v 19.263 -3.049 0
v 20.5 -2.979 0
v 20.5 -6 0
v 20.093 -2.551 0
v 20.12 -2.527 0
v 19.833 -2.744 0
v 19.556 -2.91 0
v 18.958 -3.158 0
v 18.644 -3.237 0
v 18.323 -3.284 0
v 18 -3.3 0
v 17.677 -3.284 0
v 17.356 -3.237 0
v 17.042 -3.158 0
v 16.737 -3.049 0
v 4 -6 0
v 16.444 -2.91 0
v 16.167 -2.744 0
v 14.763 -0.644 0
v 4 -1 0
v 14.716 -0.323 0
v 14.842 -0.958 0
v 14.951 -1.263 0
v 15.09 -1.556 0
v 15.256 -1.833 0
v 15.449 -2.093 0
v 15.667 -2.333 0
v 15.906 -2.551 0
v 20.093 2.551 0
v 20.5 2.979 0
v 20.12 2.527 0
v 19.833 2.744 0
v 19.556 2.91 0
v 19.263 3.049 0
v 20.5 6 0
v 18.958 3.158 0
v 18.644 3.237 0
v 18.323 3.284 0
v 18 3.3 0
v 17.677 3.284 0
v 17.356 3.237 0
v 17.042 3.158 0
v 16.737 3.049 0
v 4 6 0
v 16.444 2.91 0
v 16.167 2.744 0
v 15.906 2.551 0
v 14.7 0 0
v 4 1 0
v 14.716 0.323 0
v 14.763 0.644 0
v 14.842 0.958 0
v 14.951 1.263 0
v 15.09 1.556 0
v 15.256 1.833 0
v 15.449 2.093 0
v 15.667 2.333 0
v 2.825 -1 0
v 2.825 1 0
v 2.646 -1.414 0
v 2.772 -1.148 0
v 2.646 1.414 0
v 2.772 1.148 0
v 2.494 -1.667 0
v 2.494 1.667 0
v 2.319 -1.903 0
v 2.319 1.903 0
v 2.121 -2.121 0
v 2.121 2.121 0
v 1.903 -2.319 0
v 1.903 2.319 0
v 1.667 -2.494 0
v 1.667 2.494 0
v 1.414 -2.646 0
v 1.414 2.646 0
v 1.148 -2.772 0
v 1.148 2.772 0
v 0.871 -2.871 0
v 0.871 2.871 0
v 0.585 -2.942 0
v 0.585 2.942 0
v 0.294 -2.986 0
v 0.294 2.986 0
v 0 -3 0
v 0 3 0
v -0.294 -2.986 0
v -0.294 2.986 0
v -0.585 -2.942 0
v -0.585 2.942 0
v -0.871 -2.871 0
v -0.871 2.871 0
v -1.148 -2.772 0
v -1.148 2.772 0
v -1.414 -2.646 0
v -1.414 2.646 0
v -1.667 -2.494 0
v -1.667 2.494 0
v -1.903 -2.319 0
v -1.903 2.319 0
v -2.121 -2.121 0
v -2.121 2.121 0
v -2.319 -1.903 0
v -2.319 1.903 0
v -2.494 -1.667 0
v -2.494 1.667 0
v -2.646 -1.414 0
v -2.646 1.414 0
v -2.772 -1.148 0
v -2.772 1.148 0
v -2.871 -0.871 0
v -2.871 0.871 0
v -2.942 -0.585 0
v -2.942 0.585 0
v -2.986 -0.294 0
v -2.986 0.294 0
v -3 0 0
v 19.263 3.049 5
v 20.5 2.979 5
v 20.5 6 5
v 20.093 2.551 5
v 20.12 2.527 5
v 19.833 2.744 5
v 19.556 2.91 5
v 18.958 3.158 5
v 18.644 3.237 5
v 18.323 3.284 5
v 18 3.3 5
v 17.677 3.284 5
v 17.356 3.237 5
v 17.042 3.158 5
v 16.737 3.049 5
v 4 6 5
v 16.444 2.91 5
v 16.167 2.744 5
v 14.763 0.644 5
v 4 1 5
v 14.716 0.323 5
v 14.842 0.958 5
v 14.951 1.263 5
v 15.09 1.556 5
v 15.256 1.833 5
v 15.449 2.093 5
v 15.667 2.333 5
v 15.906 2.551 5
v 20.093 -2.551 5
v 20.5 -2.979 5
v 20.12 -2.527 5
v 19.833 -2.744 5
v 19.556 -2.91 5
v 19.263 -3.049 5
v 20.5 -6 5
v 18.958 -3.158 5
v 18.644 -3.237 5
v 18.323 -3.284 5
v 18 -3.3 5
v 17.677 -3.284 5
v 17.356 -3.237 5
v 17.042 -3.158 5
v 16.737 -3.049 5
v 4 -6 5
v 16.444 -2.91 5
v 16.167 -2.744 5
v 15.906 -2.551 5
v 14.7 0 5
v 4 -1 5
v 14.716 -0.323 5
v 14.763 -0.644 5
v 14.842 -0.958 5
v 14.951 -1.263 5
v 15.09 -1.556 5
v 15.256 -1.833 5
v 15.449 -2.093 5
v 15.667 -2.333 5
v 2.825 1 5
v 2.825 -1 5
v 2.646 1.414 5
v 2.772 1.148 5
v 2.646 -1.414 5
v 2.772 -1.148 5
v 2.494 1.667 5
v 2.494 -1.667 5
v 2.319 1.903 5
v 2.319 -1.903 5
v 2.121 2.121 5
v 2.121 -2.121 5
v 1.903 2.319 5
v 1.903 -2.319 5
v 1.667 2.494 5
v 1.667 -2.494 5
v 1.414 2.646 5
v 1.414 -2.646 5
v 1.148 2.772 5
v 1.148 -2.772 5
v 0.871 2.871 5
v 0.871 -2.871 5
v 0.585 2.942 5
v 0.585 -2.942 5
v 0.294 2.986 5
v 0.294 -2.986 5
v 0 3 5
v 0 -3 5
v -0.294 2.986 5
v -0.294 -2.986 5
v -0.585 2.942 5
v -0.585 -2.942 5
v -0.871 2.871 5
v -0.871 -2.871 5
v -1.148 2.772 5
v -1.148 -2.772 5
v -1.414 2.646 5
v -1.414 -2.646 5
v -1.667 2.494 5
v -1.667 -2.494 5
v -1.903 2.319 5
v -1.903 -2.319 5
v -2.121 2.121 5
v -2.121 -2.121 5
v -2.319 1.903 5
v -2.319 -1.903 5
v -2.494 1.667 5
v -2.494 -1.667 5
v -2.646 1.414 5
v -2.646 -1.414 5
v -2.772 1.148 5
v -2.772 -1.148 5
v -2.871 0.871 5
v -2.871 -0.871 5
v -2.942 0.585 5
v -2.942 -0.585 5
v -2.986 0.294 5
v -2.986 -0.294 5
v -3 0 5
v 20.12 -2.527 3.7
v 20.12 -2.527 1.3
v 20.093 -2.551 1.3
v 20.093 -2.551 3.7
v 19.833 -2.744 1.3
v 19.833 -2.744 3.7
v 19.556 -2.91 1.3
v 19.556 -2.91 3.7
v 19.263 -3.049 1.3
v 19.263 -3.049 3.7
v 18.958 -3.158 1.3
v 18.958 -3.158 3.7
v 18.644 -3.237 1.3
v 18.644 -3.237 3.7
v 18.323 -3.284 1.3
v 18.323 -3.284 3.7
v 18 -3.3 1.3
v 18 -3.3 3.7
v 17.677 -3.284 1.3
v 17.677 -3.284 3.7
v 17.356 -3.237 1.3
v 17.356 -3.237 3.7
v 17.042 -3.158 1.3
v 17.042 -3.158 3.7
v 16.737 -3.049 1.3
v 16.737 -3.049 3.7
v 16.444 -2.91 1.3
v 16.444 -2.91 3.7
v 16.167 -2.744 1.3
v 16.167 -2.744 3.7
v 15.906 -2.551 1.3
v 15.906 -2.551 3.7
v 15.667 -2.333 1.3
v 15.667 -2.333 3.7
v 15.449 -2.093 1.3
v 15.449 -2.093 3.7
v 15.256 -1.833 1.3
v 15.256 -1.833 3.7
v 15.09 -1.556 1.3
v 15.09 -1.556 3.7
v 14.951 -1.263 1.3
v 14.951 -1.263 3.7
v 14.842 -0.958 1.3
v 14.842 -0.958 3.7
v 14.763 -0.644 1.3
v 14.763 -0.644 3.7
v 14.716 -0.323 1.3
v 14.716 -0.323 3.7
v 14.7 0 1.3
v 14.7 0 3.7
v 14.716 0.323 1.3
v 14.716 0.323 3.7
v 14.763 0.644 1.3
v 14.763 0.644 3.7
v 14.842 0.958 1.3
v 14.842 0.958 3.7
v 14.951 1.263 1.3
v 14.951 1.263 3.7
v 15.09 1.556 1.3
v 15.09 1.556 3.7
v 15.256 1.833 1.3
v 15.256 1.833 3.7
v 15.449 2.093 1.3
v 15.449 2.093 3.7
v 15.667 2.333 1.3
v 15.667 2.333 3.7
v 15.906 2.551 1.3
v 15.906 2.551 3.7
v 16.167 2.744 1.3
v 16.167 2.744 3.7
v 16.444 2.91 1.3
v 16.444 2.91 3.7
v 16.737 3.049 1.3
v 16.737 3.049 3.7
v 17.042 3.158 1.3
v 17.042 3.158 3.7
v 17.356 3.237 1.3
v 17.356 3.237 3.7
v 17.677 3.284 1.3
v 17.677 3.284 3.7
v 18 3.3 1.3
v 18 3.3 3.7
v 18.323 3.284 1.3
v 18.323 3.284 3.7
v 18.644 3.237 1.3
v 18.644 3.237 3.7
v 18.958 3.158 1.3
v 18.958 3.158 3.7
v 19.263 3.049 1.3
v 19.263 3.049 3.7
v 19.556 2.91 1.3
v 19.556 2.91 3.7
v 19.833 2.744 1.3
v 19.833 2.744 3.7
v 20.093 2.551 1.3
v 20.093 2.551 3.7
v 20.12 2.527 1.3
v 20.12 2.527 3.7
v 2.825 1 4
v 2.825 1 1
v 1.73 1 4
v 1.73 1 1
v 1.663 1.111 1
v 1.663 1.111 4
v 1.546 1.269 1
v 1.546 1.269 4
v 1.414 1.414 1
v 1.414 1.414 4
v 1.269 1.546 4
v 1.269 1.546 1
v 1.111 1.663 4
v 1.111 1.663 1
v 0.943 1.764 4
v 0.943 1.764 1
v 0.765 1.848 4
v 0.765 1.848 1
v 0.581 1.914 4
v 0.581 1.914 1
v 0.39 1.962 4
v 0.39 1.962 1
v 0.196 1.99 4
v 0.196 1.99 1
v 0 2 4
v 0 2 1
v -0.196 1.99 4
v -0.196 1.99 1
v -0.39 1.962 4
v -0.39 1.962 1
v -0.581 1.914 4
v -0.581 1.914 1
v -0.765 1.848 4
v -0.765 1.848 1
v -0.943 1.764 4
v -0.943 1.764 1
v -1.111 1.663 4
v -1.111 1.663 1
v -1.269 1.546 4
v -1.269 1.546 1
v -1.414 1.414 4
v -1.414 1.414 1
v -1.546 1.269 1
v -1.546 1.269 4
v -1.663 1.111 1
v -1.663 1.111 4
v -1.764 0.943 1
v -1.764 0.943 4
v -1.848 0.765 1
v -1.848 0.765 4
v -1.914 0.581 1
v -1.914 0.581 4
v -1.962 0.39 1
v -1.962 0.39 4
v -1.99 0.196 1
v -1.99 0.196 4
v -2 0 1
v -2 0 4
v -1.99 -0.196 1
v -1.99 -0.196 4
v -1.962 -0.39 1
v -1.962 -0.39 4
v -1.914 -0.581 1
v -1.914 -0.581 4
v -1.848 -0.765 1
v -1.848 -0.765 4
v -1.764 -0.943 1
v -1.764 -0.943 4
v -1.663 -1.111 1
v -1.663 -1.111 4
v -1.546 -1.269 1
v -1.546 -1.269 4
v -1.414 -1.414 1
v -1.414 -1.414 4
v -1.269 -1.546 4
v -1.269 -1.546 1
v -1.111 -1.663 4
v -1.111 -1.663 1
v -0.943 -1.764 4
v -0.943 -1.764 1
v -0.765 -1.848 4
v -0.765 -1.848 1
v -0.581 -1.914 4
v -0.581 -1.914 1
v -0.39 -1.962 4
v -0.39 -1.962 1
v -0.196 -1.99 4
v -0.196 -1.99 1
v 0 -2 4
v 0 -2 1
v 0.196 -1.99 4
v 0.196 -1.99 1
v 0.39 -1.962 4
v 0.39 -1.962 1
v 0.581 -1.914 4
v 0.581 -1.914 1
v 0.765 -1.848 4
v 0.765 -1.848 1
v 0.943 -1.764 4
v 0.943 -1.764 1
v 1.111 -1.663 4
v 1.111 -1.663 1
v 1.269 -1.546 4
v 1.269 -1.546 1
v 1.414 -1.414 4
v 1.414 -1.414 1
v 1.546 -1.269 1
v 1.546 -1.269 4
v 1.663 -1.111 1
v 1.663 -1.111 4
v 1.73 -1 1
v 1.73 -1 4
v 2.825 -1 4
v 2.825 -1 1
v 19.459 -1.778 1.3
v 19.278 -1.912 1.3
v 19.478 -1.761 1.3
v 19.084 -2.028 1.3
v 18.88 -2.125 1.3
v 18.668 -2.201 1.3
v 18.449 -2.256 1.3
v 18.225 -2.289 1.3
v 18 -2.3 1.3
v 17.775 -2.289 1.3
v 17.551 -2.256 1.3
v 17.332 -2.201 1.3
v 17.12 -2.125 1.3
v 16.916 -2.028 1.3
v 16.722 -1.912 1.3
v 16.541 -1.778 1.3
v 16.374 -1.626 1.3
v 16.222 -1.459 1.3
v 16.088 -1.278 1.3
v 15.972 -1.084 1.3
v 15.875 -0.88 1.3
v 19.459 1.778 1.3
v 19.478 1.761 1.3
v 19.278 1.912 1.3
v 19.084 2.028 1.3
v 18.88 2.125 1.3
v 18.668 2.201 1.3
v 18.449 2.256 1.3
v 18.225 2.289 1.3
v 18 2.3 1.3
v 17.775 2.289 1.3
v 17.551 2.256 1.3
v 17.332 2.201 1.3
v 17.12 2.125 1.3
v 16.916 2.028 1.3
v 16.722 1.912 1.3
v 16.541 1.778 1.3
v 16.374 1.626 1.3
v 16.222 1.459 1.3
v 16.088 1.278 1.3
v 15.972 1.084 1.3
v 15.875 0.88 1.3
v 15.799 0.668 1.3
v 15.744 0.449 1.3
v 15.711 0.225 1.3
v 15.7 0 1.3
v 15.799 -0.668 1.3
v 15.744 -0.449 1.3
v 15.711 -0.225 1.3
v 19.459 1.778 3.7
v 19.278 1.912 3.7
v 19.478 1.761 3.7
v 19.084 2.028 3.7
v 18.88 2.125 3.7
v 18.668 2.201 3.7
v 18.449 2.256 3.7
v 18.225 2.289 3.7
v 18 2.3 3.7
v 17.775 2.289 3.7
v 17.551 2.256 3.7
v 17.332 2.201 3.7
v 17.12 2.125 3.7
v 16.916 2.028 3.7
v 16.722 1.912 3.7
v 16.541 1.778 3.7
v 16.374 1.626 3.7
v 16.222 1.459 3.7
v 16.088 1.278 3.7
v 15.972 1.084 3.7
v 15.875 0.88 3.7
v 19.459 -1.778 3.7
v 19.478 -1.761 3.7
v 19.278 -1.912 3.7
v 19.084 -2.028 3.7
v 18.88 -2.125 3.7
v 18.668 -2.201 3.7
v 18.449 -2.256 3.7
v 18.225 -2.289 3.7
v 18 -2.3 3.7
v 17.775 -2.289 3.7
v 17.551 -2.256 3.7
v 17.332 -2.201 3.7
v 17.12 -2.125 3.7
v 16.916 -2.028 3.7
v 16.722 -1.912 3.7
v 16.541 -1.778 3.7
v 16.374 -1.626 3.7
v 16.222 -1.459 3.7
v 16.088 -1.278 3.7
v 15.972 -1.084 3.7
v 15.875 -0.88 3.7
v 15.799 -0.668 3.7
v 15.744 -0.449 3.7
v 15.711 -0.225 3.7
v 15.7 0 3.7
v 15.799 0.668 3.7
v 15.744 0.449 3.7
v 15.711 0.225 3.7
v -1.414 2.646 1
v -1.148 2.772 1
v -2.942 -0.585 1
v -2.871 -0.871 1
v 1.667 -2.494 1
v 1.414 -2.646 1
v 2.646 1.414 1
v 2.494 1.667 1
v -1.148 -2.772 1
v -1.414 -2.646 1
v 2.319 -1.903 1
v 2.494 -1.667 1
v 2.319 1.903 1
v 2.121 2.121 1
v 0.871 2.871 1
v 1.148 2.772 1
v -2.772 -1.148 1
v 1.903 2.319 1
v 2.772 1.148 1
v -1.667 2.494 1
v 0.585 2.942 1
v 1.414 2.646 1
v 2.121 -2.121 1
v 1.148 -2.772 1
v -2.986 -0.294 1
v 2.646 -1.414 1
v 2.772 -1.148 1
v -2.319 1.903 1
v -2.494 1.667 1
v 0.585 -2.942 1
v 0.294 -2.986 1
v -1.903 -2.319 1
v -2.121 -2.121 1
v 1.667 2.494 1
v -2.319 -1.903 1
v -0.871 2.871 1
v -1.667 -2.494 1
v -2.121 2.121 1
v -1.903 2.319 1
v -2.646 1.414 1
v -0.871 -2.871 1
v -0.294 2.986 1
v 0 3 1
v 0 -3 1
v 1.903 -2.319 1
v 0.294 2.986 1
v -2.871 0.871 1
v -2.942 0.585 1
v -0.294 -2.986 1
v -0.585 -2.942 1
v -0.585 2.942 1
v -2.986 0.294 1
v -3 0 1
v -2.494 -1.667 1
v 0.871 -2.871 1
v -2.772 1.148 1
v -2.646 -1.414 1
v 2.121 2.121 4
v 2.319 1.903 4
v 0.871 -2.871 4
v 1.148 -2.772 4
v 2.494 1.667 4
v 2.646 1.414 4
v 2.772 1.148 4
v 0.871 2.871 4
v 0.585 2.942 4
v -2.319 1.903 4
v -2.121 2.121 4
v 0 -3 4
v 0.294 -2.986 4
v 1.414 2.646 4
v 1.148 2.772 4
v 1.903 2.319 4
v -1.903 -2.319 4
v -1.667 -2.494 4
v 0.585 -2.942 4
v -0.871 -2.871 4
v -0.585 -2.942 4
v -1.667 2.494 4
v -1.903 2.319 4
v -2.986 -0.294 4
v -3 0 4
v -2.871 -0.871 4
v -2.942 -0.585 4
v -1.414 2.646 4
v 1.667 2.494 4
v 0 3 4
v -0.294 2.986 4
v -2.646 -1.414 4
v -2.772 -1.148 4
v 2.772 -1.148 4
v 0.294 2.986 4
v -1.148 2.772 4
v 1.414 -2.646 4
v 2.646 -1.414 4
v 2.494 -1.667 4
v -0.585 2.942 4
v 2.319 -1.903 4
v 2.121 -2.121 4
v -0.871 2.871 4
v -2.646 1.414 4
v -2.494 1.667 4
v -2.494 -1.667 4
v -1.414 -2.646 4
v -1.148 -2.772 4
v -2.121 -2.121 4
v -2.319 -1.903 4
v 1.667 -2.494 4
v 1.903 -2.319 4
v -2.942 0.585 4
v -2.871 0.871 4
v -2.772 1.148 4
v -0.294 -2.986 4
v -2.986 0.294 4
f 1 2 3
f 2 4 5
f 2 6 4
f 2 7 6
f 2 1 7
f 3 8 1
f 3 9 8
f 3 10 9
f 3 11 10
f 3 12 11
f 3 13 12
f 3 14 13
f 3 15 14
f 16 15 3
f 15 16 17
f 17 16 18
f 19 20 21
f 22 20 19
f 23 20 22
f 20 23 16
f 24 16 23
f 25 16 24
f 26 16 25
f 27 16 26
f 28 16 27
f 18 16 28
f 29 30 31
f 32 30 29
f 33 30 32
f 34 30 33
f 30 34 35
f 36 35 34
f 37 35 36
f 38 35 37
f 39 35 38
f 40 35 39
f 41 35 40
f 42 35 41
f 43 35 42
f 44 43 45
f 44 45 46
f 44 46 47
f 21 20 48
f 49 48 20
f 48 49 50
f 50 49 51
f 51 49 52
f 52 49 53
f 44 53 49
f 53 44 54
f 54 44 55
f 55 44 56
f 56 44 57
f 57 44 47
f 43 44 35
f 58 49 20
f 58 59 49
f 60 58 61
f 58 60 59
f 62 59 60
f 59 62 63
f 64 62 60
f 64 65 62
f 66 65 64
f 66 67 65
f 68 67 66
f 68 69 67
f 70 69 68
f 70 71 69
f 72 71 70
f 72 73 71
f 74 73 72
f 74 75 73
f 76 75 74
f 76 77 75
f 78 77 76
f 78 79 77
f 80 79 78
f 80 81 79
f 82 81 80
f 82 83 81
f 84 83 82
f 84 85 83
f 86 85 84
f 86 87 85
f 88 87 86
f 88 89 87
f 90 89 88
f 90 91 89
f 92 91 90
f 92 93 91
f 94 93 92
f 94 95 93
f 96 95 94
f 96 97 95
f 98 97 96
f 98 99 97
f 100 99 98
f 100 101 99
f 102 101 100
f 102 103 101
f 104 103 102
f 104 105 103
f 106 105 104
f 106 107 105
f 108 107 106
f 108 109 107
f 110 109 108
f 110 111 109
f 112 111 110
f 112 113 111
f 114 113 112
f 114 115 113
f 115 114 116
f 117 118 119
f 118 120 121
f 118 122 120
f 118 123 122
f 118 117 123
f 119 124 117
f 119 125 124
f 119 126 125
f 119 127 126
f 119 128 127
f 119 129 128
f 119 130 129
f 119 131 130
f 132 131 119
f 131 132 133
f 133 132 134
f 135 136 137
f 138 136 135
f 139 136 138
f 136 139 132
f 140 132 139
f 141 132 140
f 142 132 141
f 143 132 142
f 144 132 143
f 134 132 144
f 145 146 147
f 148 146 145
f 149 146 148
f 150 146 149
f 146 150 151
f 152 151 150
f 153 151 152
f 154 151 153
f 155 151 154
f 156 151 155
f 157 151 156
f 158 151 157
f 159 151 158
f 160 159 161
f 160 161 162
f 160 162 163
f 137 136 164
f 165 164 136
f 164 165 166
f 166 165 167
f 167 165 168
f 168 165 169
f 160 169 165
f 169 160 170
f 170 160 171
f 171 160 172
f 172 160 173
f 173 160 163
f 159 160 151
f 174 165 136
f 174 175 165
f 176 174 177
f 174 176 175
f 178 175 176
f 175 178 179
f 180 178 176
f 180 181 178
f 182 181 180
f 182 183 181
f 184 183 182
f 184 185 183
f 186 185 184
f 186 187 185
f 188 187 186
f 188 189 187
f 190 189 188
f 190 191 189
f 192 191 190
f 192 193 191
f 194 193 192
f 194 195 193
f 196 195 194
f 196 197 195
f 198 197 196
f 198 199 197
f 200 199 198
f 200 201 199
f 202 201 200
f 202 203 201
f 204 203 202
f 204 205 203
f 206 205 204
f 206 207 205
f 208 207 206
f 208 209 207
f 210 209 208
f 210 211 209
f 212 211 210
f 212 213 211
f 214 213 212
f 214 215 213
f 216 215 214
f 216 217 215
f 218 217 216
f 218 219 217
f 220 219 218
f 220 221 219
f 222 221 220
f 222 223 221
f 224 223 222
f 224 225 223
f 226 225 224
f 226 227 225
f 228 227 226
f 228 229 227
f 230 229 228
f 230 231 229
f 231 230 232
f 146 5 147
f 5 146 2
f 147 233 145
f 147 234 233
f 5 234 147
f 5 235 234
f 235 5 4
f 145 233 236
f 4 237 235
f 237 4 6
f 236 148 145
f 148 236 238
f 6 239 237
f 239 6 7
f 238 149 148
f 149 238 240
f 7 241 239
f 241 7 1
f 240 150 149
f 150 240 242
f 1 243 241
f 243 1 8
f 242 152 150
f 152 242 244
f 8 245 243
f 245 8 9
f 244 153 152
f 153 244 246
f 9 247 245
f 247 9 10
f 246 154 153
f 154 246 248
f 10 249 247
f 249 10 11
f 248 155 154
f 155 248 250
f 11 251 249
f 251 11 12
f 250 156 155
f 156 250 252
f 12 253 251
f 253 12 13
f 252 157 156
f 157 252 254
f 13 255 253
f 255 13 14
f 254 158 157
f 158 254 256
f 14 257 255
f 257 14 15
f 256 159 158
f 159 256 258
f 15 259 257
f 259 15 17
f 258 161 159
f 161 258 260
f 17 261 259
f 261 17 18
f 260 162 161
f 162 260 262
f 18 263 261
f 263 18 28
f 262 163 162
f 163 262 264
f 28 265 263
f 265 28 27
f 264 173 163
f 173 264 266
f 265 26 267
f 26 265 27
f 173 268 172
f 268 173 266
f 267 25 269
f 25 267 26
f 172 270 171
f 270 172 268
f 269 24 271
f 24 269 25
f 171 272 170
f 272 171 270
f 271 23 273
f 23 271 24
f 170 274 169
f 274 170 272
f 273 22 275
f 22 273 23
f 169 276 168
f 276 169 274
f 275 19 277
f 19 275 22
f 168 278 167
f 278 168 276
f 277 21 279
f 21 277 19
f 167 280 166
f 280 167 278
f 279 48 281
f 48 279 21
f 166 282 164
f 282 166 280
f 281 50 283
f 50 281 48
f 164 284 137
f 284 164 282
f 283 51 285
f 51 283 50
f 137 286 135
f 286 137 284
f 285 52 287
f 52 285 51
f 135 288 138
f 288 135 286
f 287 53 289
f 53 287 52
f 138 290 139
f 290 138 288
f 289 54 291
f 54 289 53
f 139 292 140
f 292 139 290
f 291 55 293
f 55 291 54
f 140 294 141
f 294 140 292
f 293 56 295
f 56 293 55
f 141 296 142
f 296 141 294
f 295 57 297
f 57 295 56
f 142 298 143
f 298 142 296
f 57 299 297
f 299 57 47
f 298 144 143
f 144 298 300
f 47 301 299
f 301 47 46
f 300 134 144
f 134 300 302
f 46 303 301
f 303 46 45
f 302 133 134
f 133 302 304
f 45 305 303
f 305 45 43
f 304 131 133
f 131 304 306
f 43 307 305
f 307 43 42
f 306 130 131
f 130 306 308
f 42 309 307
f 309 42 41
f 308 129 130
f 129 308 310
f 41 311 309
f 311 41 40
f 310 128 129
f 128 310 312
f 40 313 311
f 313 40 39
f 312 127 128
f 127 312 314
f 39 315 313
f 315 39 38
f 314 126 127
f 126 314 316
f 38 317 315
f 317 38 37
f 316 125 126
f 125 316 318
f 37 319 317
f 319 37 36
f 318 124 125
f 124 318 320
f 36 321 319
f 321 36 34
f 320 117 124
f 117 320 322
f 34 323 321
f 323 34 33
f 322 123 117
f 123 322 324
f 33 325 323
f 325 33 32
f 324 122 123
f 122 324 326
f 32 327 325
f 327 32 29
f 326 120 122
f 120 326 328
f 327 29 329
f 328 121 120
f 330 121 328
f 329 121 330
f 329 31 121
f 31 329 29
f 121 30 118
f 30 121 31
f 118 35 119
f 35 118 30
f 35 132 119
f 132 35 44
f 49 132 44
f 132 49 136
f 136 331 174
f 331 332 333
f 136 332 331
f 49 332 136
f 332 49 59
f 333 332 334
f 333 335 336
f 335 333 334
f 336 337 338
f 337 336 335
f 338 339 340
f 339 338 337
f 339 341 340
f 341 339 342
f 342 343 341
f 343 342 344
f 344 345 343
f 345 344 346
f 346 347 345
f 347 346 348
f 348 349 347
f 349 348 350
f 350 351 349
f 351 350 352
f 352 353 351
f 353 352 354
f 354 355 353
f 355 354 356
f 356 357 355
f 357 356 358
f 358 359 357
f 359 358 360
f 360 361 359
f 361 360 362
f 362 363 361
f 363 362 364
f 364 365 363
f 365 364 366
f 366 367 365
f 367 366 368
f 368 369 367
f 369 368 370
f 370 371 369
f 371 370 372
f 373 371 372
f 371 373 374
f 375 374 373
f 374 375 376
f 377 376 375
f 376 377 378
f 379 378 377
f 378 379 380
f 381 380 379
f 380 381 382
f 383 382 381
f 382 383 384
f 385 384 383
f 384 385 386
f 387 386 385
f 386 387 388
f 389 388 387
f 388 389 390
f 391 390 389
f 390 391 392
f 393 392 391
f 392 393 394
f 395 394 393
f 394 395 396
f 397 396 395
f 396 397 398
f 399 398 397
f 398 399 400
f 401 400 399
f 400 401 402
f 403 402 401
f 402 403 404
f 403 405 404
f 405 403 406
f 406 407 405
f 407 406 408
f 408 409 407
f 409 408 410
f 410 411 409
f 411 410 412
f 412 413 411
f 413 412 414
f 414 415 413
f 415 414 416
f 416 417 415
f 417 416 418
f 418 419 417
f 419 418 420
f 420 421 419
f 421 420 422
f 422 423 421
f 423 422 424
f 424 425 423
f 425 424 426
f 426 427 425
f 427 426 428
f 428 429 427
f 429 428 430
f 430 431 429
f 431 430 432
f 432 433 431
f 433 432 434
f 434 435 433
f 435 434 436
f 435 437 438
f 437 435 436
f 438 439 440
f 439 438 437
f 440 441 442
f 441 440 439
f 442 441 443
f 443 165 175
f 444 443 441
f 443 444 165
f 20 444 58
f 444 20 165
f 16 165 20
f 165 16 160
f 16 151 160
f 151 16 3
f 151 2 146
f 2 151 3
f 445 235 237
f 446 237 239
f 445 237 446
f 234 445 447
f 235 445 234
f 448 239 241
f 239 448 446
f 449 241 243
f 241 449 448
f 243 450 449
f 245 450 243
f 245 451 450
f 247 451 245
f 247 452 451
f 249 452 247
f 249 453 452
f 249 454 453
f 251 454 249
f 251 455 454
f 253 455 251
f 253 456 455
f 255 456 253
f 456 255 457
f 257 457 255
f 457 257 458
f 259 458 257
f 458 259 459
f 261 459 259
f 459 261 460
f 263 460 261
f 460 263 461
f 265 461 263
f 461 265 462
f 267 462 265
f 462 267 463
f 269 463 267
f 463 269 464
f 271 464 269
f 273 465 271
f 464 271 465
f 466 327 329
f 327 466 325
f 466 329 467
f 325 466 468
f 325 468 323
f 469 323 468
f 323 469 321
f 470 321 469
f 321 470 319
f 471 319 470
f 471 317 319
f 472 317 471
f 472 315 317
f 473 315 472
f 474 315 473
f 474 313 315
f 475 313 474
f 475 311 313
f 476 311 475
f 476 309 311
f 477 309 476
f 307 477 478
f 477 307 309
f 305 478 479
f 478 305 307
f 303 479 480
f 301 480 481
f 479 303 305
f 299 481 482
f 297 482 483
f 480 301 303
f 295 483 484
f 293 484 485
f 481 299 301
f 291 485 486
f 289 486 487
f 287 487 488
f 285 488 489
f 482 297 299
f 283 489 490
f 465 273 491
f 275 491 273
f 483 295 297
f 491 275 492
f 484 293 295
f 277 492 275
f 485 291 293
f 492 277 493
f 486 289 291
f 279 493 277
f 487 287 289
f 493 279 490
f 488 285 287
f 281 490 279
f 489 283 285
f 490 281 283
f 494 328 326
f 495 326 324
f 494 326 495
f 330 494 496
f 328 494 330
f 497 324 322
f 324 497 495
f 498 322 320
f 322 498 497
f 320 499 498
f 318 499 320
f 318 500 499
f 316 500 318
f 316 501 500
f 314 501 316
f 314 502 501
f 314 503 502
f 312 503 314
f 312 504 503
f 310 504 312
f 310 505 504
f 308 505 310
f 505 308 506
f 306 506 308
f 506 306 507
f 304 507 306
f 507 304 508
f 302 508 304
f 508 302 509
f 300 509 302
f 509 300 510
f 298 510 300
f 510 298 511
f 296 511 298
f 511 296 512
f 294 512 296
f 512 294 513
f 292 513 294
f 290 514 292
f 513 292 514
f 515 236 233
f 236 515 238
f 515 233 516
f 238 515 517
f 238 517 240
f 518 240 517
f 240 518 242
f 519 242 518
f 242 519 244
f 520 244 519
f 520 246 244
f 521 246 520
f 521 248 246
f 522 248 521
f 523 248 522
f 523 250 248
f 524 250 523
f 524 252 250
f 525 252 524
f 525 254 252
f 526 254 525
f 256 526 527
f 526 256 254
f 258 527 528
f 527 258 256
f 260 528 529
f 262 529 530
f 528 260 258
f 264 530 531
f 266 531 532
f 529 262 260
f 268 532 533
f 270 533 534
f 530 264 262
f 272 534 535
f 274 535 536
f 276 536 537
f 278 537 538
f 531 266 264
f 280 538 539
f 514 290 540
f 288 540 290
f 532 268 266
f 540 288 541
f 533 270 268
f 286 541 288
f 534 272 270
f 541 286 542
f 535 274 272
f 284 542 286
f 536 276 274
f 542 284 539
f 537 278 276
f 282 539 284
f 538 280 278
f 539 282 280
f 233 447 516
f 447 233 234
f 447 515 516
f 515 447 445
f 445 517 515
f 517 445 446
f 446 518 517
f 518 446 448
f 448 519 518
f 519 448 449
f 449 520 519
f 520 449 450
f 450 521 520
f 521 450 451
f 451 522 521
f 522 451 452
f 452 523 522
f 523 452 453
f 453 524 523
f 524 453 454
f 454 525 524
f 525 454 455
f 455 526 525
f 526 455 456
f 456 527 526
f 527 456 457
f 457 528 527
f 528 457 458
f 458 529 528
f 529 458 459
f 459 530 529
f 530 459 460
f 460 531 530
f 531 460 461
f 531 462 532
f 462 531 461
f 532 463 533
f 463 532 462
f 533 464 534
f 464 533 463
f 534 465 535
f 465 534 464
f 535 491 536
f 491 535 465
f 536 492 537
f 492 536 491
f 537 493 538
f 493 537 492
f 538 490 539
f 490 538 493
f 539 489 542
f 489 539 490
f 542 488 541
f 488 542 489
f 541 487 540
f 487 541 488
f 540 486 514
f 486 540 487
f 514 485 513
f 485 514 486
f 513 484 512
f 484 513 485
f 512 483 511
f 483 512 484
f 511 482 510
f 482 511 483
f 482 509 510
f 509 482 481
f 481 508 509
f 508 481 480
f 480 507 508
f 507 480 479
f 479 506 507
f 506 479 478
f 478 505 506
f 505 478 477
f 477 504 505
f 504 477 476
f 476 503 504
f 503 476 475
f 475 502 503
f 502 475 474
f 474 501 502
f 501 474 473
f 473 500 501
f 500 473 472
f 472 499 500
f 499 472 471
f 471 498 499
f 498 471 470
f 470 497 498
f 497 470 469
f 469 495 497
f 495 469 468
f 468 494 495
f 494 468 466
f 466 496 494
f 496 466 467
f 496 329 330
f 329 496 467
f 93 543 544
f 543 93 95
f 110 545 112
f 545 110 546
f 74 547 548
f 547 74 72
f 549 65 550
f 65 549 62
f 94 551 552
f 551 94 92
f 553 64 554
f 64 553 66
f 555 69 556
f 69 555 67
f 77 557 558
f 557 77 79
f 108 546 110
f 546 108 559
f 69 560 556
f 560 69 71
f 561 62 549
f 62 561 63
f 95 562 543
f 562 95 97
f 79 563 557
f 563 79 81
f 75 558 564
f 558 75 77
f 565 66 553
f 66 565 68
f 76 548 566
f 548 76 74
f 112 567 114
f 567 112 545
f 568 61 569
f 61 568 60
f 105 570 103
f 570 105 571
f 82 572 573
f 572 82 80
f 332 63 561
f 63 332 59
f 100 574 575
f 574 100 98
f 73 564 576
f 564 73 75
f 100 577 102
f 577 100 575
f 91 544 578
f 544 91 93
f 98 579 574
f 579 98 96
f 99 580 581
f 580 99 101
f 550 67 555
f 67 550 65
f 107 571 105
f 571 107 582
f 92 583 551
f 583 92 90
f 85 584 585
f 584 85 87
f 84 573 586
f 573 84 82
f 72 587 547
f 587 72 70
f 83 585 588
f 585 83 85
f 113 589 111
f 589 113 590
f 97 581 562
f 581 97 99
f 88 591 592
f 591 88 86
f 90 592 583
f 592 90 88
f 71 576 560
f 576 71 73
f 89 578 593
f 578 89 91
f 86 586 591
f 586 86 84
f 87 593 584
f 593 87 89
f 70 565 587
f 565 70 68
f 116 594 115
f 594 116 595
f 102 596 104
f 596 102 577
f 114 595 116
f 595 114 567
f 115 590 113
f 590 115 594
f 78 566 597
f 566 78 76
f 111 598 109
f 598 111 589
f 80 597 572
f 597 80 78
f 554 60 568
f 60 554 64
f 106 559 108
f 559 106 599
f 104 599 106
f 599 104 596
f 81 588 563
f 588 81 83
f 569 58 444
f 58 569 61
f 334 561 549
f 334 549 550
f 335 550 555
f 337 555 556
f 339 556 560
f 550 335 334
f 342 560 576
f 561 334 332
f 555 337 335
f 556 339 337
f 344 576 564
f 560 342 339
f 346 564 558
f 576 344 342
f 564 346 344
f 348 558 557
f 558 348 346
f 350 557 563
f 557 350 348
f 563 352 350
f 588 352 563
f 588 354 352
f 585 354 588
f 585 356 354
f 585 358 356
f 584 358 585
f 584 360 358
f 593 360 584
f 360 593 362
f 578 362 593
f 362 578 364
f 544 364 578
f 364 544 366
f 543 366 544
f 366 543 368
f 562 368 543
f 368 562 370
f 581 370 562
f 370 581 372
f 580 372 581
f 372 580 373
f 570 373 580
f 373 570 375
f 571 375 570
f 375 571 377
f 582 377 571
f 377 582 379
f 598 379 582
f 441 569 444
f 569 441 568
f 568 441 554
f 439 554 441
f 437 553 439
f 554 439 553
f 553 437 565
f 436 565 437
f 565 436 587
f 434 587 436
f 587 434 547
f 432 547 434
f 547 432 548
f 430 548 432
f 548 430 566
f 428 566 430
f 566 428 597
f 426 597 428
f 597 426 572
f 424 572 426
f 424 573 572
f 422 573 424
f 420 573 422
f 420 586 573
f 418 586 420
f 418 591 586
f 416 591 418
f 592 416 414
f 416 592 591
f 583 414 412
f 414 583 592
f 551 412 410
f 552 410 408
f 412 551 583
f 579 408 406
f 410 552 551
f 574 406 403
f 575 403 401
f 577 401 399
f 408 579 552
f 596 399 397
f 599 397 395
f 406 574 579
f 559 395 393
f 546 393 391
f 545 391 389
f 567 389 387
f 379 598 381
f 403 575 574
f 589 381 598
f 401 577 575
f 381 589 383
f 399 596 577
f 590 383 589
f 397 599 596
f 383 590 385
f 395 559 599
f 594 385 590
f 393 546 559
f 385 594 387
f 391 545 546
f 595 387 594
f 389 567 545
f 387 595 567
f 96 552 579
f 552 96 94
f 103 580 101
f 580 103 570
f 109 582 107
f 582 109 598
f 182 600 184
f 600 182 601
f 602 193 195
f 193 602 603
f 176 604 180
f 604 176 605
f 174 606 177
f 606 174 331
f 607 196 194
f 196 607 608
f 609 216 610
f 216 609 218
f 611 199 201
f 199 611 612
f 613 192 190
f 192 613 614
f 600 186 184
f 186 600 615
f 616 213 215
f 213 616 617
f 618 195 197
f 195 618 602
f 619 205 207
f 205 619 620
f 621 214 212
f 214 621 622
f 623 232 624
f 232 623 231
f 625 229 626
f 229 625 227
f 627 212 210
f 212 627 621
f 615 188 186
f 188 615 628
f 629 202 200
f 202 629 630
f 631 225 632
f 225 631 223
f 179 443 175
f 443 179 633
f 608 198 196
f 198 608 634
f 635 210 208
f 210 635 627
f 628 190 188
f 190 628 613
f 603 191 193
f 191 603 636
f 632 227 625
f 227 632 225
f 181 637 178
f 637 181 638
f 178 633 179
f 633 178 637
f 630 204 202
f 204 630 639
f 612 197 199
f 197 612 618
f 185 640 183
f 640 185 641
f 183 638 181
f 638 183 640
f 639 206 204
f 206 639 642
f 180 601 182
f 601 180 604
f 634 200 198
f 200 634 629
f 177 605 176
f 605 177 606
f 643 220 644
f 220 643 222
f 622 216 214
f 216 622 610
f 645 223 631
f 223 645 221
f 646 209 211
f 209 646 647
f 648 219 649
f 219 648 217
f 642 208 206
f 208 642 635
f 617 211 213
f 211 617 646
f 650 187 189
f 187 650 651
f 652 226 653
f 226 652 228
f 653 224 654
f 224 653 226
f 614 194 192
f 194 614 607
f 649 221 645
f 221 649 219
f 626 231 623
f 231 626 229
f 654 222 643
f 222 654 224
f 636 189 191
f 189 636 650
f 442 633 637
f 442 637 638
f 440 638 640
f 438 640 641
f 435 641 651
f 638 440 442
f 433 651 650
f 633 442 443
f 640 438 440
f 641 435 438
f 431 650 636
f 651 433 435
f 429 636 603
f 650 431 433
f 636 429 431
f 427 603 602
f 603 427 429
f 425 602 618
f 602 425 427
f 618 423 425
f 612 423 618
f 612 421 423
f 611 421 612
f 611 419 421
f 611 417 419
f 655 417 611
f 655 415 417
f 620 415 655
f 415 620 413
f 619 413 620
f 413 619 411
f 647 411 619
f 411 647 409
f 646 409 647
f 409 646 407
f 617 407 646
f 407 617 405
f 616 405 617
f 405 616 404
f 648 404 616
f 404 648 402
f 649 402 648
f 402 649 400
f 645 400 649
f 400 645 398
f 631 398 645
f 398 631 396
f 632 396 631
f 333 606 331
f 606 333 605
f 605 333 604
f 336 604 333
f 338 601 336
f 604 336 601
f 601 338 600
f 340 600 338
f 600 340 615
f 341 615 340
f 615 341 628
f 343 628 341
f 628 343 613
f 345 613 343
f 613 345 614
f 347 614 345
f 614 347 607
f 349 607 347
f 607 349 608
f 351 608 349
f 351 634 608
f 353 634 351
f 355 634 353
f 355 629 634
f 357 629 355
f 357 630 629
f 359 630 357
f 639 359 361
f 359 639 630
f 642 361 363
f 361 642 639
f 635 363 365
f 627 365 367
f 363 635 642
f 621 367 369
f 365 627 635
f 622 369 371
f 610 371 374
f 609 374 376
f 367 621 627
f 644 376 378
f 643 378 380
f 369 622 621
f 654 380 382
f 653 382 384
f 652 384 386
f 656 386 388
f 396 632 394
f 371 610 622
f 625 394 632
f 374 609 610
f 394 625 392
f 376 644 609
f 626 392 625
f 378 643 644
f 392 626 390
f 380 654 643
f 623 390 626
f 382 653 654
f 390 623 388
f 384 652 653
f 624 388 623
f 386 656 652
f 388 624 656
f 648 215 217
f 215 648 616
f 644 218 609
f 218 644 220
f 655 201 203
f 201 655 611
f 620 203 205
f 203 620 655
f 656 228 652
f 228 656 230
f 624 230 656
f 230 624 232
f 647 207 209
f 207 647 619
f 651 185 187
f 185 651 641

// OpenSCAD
part = "link"; // [link, assembly]
cadverify_only = "";
module instance(name, part, unit = 1) {
    echo(cadverify_instance = [name, part, unit]);
    if (cadverify_only == "" || cadverify_only == name) children();
}

// Parameters (mm)
pitch = 18;          // pin-to-bore distance
link_w = 12;         // width (Y)
link_t = 5;          // thickness (Z)
pin_d = 4;           // pin shaft diameter
bore_d = 4.6;        // bore diameter (0.3 radial clearance)
cap_d = 6;           // cap diameter
cap_h = 1;           // cap thickness
gap_z = 0.3;         // vertical clearance cap<->knuckle
kn_h = 2.4;          // knuckle height = 5-2*1-2*0.3
kn_out_d = 7.6;      // knuckle outer diameter (1.5 wall)
cap_cav_d = 6.6;     // cap cavity diameter (0.3 radial clearance)
neck_w = 2;          // neck width
slot_half = 50;      // slot half-angle (deg), allows +-30 deg swing
yoke_east = 20.5;    // full-height yoke east extent (local X)
$fn = 64;

module link_geom() {
    bore_x = pitch;
    cap_r = cap_d/2;
    cav_r = cap_cav_d/2;
    pin_r = pin_d/2;
    bore_r = bore_d/2;
    kn_out_r = kn_out_d/2;
    // far points for slot wedge (full height + middle)
    // wedge from bore center to the east, half-angle slot_half
    wedge_far = 30;
    dy_far = wedge_far * tan(slot_half);
    // ---- full height (0..5): yoke + neck + pin shaft ----
    linear_extrude(height = link_t, convexity = 8) {
        difference() {
            union() {
                // pin shaft disc
                translate([0,0]) circle(r = pin_r);
                // neck rect X[0,5] Y[-1,1]
                translate([0,-neck_w/2]) square([5, neck_w]);
                // yoke base rect X[4,yoke_east] Y[-6,6]
                translate([4,-link_w/2]) square([yoke_east-4, link_w]);
            }
            // cap cavity (for next link caps)
            translate([bore_x,0]) circle(r = cav_r);
            // slot wedge for next-link neck swing (full height)
            polygon(points = [[bore_x,0],[bore_x+wedge_far, dy_far],[bore_x+wedge_far, -dy_far]]);
        }
    }
    // ---- middle knuckle ring (1.3..3.7) ----
    kn_bot = cap_h + gap_z; // 1.3
    translate([0,0,kn_bot])
    linear_extrude(height = kn_h, convexity = 8) {
        difference() {
            translate([bore_x,0]) circle(r = kn_out_r);
            translate([bore_x,0]) circle(r = bore_r);
            polygon(points = [[bore_x,0],[bore_x+wedge_far, dy_far],[bore_x+wedge_far, -dy_far]]);
        }
    }
    // ---- caps ----
    translate([0,0,0]) cylinder(h = cap_h, r = cap_r);
    translate([0,0,link_t-cap_h]) cylinder(h = cap_h, r = cap_r);
}

if (part == "assembly") {
    instance("link1", "link", 1) translate([0,0,0]) link_geom();
    instance("link2", "link", 1) translate([18,0,0]) link_geom();
    instance("link3", "link", 1) translate([36,0,0]) link_geom();
    echo(cadverify_spec = [
        ["bounds", [[-3, -6, 0], [56.5, 6, 5]]],
        ["support_faces", [["bed", "-z", 200]]],
        ["motions", [
            ["bend", ["link3"], "rotate", [36, 0, 0], [0, 0, 1], [-30, 30]]
        ]],
        ["assembly_order", [
            [["link1", "link2", "link3"], [0, 0, 0]]
        ]],
        ["print_in_place", 0.3],
        ["overhangs_allowed", [
            ["pin cap link1", [[-3, -3, 3.8], [3, 3, 4.2]]],
            ["knuckle joint1", [[14.5, -3.5, 1.0], [21, 3.5, 1.5]]],
            ["pin cap link2", [[15, -3, 3.8], [21, 3, 4.2]]],
            ["knuckle joint2", [[32.5, -3.5, 1.0], [39, 3.5, 1.5]]],
            ["pin cap link3", [[33, -3, 3.8], [39, 3, 4.2]]],
            ["knuckle end", [[50.5, -3.5, 1.0], [57, 3.5, 1.5]]]
        ]],
        ["held", ["link1", "link2", "link3"]]
    ]);
} else {
    link_geom();
    echo(cadverify_spec = [
        ["bounds", [[-3, -6, 0], [20.5, 6, 5]]],
        ["bodies", 1],
        ["through_holes", 0],
        ["support_faces", [["bed", "-z", 100]]],
        ["overhangs_allowed", [
            ["pin cap", [[-3, -3, 3.8], [3, 3, 4.2]]],
            ["knuckle ceiling", [[14.5, -3.5, 1.0], [21, 3.5, 1.5]]]
        ]],
        ["copies", 3],
        ["details", [
            ["body", "material", [[4, -6, 0], [14, 6, 5]], 0.85],
            ["neck", "material", [[0, -1, 0], [5, 1, 5]], 0.8],
            ["knuckle", "material", [[14.2, -3.8, 1.3], [21.8, 3.8, 3.7]], 0.25],
            ["slot", "void", [[19, -1, 0], [21, 1, 5]], 0.8],
            ["cap_cavity", "void", [[14.7, -3.3, 0], [21.3, 3.3, 1]], 0.5],
            ["wall", "thickness", [18, 7, 2.5], [0, -1, 0], 3.7],
            ["floor", "thickness", [9, 0, -1], [0, 0, 1], 5]
        ]]
    ]);
}
